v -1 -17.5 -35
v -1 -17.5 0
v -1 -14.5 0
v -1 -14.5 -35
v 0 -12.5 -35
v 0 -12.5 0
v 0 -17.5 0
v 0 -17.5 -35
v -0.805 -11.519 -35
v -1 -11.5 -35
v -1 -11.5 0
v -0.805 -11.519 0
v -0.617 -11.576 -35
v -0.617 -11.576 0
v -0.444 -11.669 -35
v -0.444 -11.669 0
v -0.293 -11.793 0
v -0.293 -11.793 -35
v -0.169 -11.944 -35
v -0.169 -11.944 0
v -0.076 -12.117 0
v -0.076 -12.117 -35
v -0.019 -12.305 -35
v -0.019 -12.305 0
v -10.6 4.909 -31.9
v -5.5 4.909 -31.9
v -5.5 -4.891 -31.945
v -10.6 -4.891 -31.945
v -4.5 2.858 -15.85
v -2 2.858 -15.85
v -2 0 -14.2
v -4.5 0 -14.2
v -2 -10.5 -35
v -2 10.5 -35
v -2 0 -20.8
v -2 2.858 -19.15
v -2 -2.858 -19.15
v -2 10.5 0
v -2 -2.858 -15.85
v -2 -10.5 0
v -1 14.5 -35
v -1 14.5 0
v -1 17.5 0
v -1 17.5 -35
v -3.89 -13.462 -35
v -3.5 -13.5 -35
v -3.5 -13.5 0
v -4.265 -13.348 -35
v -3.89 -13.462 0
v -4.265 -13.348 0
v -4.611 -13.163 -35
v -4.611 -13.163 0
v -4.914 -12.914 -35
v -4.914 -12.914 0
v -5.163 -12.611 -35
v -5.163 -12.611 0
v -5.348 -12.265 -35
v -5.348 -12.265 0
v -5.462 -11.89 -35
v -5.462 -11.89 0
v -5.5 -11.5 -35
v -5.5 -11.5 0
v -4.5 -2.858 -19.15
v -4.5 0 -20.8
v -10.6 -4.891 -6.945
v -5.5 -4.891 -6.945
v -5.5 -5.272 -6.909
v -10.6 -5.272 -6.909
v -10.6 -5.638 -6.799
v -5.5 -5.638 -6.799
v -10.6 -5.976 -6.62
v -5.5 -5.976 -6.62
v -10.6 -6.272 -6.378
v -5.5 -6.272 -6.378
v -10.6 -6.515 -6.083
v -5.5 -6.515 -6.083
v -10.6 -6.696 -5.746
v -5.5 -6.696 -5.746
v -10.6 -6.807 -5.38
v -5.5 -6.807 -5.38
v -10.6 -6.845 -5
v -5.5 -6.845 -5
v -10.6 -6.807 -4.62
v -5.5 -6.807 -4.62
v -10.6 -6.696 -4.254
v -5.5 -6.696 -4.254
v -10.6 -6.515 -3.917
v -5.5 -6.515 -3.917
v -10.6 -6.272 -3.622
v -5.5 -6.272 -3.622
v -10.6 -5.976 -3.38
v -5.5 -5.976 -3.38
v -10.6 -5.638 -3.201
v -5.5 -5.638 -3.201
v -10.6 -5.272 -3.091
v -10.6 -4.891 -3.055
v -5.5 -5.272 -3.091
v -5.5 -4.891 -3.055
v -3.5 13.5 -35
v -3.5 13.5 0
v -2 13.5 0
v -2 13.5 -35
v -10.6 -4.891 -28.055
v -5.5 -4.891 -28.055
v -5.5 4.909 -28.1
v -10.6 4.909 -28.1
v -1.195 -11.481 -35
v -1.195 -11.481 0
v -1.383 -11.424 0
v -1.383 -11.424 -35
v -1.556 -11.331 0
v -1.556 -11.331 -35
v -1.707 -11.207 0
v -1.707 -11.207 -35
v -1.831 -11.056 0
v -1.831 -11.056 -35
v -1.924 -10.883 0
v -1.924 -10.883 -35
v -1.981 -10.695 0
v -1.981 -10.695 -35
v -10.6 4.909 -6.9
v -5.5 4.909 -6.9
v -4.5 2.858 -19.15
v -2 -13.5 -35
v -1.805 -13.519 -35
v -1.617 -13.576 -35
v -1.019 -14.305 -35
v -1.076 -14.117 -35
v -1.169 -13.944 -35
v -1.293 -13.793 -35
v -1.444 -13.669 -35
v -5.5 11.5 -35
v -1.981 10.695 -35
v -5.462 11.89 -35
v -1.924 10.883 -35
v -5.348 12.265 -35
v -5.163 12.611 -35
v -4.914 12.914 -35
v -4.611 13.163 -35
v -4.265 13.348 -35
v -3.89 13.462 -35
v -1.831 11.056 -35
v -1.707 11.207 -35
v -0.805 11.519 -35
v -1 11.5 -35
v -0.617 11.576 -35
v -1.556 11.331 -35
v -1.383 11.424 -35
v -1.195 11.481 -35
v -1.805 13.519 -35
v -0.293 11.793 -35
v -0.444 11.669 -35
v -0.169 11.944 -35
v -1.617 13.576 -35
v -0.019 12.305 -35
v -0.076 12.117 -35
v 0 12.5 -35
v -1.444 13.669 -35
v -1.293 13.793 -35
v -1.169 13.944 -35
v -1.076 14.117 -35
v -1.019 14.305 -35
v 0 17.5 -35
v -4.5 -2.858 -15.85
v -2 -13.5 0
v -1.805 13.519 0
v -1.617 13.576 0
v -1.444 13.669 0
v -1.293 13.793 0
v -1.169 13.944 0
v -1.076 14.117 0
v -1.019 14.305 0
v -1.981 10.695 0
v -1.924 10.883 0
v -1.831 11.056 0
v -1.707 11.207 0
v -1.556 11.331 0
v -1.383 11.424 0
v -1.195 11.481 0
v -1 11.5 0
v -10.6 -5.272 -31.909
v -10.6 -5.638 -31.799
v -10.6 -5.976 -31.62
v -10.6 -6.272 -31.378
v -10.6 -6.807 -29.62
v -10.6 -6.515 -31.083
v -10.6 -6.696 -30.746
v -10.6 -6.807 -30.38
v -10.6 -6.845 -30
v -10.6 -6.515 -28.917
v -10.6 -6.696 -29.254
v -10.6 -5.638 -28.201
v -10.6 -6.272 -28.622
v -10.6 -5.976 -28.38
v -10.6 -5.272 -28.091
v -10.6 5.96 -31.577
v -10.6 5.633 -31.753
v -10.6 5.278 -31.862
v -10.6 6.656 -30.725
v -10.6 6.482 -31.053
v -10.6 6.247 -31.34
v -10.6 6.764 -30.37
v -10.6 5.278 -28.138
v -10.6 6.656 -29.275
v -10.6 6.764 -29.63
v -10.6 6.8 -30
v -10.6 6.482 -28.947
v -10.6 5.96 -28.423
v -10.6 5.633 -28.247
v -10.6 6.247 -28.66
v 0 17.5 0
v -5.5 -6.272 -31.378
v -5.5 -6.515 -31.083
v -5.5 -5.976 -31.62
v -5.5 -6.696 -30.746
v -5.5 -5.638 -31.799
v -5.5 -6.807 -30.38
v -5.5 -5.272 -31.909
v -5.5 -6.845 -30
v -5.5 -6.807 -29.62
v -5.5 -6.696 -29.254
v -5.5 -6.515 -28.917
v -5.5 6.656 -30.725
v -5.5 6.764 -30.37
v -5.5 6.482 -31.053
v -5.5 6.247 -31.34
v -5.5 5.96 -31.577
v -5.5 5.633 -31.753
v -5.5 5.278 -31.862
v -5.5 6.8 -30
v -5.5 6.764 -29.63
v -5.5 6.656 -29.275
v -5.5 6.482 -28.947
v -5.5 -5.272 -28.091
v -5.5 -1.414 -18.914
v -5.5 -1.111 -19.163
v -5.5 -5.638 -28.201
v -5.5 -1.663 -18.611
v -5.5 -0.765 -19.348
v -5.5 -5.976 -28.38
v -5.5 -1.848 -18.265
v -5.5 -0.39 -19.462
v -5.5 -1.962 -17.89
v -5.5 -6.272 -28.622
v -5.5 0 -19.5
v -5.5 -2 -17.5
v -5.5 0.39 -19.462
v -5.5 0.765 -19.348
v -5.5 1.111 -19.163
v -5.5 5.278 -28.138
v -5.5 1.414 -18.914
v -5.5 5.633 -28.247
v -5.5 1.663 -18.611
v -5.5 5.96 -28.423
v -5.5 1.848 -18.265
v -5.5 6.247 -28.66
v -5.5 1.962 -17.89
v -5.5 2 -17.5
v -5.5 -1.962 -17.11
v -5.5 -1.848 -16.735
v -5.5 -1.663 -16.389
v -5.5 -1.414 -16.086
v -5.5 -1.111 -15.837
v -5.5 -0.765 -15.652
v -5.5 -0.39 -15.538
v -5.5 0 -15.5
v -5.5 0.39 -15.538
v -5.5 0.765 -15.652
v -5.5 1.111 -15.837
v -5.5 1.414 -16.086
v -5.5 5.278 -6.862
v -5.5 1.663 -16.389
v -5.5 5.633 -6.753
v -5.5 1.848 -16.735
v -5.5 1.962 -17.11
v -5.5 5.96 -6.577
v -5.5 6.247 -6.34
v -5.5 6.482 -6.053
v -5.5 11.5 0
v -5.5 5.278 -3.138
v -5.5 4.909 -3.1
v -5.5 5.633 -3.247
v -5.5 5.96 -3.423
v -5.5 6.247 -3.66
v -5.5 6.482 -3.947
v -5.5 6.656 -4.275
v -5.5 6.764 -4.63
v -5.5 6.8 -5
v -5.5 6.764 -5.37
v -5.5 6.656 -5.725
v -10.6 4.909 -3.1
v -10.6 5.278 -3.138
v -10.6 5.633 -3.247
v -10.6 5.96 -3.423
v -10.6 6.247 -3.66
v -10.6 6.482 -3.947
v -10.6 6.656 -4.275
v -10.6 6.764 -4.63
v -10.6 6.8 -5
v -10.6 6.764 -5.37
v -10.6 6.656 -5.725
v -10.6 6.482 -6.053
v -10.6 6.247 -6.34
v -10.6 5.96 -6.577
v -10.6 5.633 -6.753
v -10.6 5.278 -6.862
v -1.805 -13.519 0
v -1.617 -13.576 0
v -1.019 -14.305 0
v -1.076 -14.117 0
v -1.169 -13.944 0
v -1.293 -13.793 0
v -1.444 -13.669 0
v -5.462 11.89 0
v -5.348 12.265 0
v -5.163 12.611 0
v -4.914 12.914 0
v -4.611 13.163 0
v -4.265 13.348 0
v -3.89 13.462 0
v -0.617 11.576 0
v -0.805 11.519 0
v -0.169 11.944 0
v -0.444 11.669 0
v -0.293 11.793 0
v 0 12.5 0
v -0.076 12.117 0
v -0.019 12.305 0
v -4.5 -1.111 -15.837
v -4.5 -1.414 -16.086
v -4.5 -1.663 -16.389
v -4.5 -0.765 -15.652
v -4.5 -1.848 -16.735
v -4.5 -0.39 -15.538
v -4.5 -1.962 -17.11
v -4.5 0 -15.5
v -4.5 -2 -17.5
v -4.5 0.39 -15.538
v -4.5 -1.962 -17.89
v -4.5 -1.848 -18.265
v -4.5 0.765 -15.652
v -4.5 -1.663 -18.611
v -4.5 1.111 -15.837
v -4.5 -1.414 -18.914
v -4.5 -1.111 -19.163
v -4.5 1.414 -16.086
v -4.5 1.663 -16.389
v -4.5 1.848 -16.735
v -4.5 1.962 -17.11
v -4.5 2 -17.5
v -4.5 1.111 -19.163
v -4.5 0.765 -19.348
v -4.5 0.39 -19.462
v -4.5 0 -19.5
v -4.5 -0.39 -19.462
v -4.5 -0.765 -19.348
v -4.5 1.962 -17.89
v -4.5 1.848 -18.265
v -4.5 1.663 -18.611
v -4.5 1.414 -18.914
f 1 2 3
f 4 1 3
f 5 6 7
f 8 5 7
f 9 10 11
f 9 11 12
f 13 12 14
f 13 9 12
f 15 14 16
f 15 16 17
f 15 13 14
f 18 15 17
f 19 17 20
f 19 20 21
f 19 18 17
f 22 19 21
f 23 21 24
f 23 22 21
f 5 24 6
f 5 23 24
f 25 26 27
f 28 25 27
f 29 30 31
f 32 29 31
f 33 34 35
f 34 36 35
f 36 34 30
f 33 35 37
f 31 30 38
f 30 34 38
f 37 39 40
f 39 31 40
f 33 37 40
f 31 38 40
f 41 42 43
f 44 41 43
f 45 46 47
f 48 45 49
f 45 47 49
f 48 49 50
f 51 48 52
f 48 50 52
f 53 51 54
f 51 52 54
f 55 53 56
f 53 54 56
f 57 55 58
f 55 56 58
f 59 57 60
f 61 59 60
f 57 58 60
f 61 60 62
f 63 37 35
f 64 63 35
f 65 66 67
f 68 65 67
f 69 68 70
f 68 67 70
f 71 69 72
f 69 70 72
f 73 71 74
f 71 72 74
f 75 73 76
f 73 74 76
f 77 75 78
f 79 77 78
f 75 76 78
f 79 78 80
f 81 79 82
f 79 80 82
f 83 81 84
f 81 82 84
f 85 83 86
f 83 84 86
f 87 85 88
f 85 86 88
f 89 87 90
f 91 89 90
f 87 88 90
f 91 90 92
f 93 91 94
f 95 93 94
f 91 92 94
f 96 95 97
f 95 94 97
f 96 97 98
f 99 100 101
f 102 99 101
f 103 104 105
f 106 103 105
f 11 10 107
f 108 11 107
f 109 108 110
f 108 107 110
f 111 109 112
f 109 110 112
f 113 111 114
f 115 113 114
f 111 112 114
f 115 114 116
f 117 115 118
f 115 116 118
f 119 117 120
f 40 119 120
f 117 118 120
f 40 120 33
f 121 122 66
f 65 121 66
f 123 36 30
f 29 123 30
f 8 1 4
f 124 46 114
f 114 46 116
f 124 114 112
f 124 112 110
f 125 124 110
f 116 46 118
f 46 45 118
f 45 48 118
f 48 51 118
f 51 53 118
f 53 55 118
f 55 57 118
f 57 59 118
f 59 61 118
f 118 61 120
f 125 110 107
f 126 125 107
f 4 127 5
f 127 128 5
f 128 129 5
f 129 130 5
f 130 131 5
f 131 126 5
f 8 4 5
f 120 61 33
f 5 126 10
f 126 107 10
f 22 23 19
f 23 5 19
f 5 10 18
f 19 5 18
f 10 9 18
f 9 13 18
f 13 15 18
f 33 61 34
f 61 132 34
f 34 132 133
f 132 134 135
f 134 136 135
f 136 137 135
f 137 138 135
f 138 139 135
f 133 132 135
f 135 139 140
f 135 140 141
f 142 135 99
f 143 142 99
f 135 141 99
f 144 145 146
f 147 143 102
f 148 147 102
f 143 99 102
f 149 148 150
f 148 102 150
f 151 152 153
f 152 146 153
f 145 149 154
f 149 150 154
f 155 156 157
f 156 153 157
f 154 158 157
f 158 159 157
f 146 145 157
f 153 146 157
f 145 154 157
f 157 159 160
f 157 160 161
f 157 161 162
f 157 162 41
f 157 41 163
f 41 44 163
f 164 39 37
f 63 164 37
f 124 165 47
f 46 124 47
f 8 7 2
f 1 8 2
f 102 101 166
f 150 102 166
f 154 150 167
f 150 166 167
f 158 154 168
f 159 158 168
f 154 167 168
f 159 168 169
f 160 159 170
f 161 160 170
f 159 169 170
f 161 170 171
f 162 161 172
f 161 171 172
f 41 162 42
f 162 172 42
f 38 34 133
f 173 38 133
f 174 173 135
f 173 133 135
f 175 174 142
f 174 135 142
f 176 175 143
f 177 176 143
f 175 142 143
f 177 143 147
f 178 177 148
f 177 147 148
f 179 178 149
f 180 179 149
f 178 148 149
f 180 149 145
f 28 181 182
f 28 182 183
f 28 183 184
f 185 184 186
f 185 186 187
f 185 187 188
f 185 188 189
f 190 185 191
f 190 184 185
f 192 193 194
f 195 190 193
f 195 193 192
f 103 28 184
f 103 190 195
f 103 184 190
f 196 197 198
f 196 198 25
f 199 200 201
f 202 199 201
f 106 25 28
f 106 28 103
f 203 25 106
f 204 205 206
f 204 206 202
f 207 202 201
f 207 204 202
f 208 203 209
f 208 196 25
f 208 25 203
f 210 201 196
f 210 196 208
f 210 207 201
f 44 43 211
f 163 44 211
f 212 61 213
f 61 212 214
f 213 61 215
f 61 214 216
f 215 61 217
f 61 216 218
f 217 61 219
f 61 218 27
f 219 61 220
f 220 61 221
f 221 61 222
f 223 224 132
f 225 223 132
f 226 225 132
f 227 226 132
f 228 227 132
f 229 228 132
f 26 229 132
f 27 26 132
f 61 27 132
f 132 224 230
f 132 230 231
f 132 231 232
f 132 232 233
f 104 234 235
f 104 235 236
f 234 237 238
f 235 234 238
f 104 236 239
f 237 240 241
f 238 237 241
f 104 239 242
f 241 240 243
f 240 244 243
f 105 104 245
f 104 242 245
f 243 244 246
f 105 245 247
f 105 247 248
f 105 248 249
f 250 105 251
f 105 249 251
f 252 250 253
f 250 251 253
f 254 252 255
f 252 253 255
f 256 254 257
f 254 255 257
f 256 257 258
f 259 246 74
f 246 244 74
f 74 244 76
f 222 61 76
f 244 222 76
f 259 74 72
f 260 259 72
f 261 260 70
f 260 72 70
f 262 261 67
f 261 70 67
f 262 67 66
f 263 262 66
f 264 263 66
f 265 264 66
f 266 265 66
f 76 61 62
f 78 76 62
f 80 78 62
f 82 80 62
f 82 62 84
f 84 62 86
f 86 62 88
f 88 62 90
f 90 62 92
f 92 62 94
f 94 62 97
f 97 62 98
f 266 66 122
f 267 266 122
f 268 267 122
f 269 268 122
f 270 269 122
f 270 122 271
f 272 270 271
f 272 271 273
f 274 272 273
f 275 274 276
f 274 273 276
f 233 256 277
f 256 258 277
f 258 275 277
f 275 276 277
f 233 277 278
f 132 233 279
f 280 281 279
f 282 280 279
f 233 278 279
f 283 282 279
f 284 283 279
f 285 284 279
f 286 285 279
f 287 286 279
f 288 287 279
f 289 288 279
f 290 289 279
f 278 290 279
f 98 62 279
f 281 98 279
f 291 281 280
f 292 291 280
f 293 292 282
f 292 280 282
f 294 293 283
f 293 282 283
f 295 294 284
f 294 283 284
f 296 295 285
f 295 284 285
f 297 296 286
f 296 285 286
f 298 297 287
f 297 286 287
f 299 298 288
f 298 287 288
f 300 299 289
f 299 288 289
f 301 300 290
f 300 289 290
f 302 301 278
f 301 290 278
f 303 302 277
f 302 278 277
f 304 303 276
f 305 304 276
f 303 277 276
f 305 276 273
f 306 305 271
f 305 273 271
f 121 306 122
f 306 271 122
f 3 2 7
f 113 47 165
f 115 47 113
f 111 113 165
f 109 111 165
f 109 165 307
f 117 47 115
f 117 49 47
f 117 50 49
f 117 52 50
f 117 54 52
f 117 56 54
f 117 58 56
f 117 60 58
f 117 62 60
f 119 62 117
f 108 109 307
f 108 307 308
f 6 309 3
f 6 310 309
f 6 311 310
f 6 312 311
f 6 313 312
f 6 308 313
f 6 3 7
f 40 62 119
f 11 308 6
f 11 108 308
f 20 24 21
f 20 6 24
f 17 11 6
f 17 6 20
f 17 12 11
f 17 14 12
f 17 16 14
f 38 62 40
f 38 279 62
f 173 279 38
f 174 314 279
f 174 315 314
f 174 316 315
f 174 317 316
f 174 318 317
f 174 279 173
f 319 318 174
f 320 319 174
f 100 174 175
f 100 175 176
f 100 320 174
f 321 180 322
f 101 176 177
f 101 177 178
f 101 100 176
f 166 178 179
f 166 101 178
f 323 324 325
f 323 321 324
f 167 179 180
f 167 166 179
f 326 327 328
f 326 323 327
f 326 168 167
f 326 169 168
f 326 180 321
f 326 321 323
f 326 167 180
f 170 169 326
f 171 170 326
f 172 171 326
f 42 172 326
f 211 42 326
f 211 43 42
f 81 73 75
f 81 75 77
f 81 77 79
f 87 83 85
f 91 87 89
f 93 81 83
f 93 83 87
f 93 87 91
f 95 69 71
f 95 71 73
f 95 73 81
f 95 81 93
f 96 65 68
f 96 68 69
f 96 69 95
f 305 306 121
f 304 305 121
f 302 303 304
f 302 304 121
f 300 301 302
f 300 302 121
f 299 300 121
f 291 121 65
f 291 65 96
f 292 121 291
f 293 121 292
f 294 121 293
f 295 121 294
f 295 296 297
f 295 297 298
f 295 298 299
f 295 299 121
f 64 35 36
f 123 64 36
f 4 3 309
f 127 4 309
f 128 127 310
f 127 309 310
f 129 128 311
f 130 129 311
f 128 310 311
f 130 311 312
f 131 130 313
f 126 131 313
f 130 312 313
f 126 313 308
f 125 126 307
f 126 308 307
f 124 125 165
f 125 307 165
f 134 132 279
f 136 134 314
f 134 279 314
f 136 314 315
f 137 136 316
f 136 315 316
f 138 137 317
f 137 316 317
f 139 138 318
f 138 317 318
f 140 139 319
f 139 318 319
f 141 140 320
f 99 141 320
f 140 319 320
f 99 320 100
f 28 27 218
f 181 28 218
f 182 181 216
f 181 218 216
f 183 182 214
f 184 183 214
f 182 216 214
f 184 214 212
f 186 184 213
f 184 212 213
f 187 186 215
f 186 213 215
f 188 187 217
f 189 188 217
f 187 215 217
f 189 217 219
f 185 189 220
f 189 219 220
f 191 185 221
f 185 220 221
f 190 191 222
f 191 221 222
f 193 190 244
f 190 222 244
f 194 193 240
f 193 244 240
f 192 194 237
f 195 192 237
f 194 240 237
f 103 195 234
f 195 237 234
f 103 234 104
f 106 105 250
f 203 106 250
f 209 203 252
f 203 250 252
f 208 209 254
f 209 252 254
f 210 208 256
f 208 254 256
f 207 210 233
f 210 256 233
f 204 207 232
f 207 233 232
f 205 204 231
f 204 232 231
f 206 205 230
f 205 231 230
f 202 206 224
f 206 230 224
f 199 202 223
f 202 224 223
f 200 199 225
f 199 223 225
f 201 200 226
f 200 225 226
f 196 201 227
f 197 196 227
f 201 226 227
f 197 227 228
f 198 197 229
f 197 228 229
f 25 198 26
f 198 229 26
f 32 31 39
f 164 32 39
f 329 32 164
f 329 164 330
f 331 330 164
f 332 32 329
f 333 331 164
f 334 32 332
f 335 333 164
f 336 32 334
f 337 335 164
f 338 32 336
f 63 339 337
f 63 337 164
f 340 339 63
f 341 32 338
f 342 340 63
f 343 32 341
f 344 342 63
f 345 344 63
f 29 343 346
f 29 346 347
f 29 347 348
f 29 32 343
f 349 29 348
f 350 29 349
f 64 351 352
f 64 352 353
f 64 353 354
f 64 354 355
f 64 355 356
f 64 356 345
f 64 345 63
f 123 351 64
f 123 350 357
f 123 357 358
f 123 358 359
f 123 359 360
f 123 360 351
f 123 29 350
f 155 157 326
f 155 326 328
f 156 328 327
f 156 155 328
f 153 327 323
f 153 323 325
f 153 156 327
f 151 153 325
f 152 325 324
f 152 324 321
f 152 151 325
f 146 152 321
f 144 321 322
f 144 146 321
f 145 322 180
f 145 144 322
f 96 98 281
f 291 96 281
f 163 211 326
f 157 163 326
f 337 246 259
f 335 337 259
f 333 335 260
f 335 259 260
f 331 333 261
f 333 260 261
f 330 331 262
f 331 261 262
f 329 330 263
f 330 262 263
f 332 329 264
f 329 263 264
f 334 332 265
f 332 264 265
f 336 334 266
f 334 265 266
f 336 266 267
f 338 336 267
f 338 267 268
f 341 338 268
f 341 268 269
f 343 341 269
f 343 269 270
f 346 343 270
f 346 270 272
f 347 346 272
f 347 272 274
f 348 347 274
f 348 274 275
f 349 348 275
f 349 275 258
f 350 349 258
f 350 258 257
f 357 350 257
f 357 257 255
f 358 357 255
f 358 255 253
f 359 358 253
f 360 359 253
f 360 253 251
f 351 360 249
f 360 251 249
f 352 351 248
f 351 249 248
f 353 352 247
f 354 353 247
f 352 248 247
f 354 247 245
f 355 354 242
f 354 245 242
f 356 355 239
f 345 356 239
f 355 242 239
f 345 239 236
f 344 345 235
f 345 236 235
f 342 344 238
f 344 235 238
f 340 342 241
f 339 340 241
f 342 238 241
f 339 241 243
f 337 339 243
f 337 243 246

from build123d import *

# Parameters (mm, degrees)
EXTRUDE_1_DEPTH     = 35
FILLET_START        = -36
FILLET_1_DEPTH      = 37
FILLET_START_2      = -35
FILLET_1_2_DEPTH    = 35
SKETCH_2_R          = 2
CUT_EXTRUDE_1_DEPTH = 40.515819617
CUT_EXTRUDE_2_DEPTH = 2.5
EXTRUDE_2_DEPTH     = 5.1


with BuildPart() as part:
    # 草图1 → 凸台-拉伸1 (new body)
    with BuildSketch(Plane.XY):
        with BuildLine():
            Line((-2, 11.5), (-2, -11.5))
            Line((-2, -11.5), (0, -11.5))
            Line((0, -11.5), (0, -14.5))
            Line((0, -14.5), (0, -17.5))
            Line((0, -17.5), (-1, -17.5))
            Line((-1, -17.5), (-1, -14.5))
            ThreePointArc((-1, -14.5), (-1.292893219, -13.792893219), (-2, -13.5))
            Line((-2, -13.5), (-3.5, -13.5))
            ThreePointArc((-3.5, -13.5), (-4.914213562, -12.914213562), (-5.5, -11.5))
            Line((-5.5, -11.5), (-5.5, 11.5))
            ThreePointArc((-5.5, 11.5), (-4.914213562, 12.914213562), (-3.5, 13.5))
            Line((-3.5, 13.5), (-2, 13.5))
            ThreePointArc((-2, 13.5), (-1.292893219, 13.792893219), (-1, 14.5))
            Line((-1, 14.5), (-1, 17.5))
            Line((-1, 17.5), (0, 17.5))
            Line((0, 17.5), (0, 14.5))
            Line((0, 14.5), (0, 11.5))
            Line((0, 11.5), (-2, 11.5))
        make_face()
    extrude(amount=-EXTRUDE_1_DEPTH)

    # 圆角1: read off the stored shape, not the designer's step
    # 圆角1 outline → 圆角1 (cut)
    with BuildSketch(Plane.XY.offset(FILLET_START)):
        with BuildLine():
            Line((0, -11.5), (-1, -11.5))
            ThreePointArc((-1, -11.5), (-0.292893219, -11.792893219), (0, -12.5))
            Line((0, -12.5), (0, -11.5))
        make_face()
        with BuildLine():
            ThreePointArc((0, 12.5), (-0.292893219, 11.792893219), (-1, 11.5))
            Line((-1, 11.5), (0, 11.5))
            Line((0, 11.5), (0, 12.5))
        make_face()
    extrude(amount=FILLET_1_DEPTH, mode=Mode.SUBTRACT)

    # Fillet 1 2 outline → Fillet 1 2 (add)
    with BuildSketch(Plane.XY.offset(FILLET_START_2)):
        with BuildLine():
            Line((-2, -11.5), (-1, -11.5))
            ThreePointArc((-1, -11.5), (-1.707106781, -11.207106781), (-2, -10.5))
            Line((-2, -10.5), (-2, -11.5))
        make_face()
        with BuildLine():
            Line((-2, 11.5), (-2, 10.5))
            ThreePointArc((-2, 10.5), (-1.707106781, 11.207106781), (-1, 11.5))
            Line((-1, 11.5), (-2, 11.5))
        make_face()
    extrude(amount=FILLET_1_2_DEPTH)

    # 草图2 → 切除-拉伸1 (cut, through all)
    with BuildSketch(Plane.ZY.offset(5.5)):
        with Locations(Location((-17.5, 0, 0), (0, 0, 270))):
            Circle(SKETCH_2_R)
    extrude(amount=-CUT_EXTRUDE_1_DEPTH, mode=Mode.SUBTRACT)

    # 草图3 → 切除-拉伸2 (cut)
    with BuildSketch(Plane(origin=(-2, 0, 0), x_dir=(0, 0, -1), z_dir=(1, 0, 0))):
        Polygon((19.15, -2.857883832), (20.8, 0), (19.15, 2.857883832), (15.85, 2.857883832), (14.2, 0), (15.85, -2.857883832), align=None)
    extrude(amount=-CUT_EXTRUDE_2_DEPTH, mode=Mode.SUBTRACT)

    # 草图4 → 凸台-拉伸2 (add)
    with BuildSketch(Plane.ZY.offset(5.5)):
        with BuildLine():
            Line((-3.055300855, -4.891227974), (-3.100019781, 4.908669996))
            ThreePointArc((-3.100019781, 4.908669996), (-5, 6.8), (-6.899980219, 4.908669996))
            Line((-6.899980219, 4.908669996), (-6.944699145, -4.891227974))
            ThreePointArc((-6.944699145, -4.891227974), (-5, -6.844821423), (-3.055300855, -4.891227974))
        make_face()
        with BuildLine():
            Line((-31.899980219, 4.908669996), (-31.944699145, -4.891227974))
            ThreePointArc((-31.944699145, -4.891227974), (-30, -6.844821423), (-28.055300855, -4.891227974))
            Line((-28.055300855, -4.891227974), (-28.100019781, 4.908669996))
            ThreePointArc((-28.100019781, 4.908669996), (-30, 6.8), (-31.899980219, 4.908669996))
        make_face()
    extrude(amount=EXTRUDE_2_DEPTH)


solid = part.part
